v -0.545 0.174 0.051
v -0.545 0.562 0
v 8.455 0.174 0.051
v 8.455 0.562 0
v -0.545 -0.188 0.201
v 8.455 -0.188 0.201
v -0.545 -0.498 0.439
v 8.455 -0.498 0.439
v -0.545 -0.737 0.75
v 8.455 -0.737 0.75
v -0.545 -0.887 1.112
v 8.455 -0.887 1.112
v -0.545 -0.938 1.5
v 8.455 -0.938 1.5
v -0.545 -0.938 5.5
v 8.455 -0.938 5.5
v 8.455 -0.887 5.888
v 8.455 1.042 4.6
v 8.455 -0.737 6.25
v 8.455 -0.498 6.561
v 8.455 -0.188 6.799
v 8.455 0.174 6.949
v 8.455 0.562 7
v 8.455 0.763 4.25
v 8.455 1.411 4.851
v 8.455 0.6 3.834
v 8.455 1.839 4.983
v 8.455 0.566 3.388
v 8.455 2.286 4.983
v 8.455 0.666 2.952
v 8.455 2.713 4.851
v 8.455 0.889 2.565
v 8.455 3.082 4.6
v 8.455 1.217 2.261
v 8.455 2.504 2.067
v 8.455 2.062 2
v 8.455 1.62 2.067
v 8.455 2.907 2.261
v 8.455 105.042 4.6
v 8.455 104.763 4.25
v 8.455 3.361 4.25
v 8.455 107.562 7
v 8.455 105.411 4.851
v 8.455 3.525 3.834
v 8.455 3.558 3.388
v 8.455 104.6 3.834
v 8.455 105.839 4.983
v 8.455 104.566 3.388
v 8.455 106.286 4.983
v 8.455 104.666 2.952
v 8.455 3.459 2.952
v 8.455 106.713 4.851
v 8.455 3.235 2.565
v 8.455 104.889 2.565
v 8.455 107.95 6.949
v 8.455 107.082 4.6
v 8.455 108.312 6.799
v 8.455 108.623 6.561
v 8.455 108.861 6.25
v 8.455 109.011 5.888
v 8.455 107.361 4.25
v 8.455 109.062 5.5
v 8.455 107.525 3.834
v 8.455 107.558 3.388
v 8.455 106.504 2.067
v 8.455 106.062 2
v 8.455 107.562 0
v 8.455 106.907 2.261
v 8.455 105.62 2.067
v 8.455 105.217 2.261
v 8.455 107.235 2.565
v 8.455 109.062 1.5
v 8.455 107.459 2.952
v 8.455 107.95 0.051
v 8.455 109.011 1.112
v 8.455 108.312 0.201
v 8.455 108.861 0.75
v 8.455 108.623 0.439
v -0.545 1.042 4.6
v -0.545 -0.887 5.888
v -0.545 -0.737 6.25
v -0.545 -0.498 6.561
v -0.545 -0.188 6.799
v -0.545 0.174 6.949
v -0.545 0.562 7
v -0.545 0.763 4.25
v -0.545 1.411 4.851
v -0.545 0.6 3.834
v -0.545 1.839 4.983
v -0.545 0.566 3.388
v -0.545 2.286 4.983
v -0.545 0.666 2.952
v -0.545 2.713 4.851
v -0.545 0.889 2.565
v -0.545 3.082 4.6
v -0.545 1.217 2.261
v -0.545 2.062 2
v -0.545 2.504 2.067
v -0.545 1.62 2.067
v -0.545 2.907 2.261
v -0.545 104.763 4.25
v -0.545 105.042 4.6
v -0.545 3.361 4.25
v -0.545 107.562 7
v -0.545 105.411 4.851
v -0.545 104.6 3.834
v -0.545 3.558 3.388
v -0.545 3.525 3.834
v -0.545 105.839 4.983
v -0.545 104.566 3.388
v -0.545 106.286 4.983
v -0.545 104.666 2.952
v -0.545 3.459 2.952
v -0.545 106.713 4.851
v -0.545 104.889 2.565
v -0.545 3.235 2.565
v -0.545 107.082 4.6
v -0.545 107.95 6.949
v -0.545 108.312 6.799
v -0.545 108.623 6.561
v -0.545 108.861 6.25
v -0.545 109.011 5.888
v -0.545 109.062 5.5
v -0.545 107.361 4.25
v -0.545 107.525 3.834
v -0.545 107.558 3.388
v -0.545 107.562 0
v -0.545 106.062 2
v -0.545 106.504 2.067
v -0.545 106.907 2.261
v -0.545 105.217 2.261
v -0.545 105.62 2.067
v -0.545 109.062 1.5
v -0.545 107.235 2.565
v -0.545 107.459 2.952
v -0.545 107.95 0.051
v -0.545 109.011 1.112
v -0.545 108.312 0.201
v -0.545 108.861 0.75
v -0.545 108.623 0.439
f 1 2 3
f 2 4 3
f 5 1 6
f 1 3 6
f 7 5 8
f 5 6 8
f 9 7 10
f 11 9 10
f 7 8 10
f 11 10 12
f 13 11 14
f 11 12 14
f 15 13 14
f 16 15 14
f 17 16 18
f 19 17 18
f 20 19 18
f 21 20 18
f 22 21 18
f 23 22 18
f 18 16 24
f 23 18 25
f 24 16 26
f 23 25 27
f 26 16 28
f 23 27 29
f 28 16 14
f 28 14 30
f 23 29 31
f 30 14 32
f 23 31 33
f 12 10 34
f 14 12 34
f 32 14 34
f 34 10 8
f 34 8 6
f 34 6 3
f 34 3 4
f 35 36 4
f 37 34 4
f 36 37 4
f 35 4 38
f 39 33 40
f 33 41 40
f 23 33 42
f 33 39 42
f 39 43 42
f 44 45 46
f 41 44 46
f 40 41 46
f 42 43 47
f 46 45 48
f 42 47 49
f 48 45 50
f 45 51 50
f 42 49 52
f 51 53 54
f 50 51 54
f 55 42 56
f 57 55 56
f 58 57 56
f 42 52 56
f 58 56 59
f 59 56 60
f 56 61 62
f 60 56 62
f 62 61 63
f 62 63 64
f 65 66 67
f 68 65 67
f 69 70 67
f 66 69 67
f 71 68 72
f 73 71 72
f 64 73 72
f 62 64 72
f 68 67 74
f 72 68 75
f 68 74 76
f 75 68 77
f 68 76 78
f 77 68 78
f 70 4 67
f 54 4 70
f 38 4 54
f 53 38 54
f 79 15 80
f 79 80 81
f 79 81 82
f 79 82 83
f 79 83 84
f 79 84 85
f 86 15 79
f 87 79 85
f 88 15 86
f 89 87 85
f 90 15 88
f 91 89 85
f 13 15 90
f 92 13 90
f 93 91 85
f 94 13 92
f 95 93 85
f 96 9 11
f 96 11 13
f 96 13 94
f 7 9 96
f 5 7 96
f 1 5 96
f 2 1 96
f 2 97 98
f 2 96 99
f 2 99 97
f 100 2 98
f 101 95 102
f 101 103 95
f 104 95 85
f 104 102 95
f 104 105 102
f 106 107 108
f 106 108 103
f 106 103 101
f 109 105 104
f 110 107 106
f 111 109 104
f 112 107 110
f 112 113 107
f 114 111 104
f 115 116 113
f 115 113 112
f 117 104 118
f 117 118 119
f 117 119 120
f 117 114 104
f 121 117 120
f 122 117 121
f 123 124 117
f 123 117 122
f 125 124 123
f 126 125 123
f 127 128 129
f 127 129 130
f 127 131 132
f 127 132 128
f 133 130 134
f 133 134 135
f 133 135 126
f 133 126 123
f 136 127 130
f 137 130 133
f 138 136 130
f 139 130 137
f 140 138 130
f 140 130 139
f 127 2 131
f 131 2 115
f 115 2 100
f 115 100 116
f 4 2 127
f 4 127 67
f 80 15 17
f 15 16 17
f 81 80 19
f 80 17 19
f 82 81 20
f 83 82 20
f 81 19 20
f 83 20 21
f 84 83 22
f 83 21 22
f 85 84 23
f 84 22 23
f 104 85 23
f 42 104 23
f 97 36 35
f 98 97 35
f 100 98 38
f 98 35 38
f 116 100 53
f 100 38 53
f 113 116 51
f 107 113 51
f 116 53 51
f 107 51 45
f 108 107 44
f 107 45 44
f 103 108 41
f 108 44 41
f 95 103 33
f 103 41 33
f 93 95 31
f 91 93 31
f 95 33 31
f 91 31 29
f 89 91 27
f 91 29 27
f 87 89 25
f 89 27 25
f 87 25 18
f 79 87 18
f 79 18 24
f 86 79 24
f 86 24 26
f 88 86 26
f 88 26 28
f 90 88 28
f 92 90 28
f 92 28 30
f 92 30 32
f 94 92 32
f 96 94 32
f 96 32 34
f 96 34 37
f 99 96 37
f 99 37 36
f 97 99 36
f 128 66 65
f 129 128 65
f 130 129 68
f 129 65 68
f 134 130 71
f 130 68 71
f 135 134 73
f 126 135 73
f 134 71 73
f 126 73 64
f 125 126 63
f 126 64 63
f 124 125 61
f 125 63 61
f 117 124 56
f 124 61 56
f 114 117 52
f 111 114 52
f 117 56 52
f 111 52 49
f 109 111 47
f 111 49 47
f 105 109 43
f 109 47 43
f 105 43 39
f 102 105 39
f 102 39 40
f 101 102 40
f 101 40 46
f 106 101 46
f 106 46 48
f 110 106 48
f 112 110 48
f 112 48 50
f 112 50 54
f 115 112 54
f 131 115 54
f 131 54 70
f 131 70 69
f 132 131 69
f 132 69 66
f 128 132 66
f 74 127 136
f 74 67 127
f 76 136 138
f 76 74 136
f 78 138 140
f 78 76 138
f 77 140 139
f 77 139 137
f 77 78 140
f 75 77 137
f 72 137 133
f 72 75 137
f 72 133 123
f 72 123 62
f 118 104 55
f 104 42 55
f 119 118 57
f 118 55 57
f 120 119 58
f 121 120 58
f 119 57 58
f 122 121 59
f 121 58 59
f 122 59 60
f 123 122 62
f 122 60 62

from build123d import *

# Parameters (mm, degrees)
SKETCH1_W           = 9
SKETCH1_H           = 110
BOSS_EXTRUDE2_DEPTH = 7
SKETCH4_R           = 1.5
CUT_EXTRUDE2_DEPTH  = 10
SKETCH6_R           = 1.5
CUT_EXTRUDE4_DEPTH  = 10
FILLET1_R           = 1.5
FILLET2_R           = 1.5


with BuildPart() as part:
    # Sketch1 → Boss-Extrude2 (new body)
    with BuildSketch(Plane.XY):
        with Locations((3.95483871, 54.062211982)):
            Rectangle(SKETCH1_W, SKETCH1_H)
    extrude(amount=BOSS_EXTRUDE2_DEPTH)

    # Sketch4 → Cut-Extrude2 (cut, through all)
    with BuildSketch(Plane(origin=(8.45483871, 0, 0), x_dir=(0, 0, -1), z_dir=(1, 0, 0))):
        with Locations((-3.5, 2.062211982)):
            Circle(SKETCH4_R)
    extrude(amount=-CUT_EXTRUDE2_DEPTH, mode=Mode.SUBTRACT)

    # Sketch6 → Cut-Extrude4 (cut, through all)
    with BuildSketch(Plane(origin=(8.45483871, 0, 0), x_dir=(0, 0, -1), z_dir=(1, 0, 0))):
        with Locations((-3.5, 106.062211982)):
            Circle(SKETCH6_R)
    extrude(amount=-CUT_EXTRUDE4_DEPTH, mode=Mode.SUBTRACT)

    # Fillet1
    fillet1_edges = [part.edges().sort_by_distance(p)[0] for p in [
        (3.95483871, 109.062211982, 7),
        (3.95483871, 109.062211982, 0),
    ]]
    fillet(fillet1_edges, radius=FILLET1_R)

    # Fillet2
    fillet2_edges = [part.edges().sort_by_distance(p)[0] for p in [
        (3.95483871, -0.937788018, 7),
        (3.95483871, -0.937788018, 0),
    ]]
    fillet(fillet2_edges, radius=FILLET2_R)


solid = part.part
